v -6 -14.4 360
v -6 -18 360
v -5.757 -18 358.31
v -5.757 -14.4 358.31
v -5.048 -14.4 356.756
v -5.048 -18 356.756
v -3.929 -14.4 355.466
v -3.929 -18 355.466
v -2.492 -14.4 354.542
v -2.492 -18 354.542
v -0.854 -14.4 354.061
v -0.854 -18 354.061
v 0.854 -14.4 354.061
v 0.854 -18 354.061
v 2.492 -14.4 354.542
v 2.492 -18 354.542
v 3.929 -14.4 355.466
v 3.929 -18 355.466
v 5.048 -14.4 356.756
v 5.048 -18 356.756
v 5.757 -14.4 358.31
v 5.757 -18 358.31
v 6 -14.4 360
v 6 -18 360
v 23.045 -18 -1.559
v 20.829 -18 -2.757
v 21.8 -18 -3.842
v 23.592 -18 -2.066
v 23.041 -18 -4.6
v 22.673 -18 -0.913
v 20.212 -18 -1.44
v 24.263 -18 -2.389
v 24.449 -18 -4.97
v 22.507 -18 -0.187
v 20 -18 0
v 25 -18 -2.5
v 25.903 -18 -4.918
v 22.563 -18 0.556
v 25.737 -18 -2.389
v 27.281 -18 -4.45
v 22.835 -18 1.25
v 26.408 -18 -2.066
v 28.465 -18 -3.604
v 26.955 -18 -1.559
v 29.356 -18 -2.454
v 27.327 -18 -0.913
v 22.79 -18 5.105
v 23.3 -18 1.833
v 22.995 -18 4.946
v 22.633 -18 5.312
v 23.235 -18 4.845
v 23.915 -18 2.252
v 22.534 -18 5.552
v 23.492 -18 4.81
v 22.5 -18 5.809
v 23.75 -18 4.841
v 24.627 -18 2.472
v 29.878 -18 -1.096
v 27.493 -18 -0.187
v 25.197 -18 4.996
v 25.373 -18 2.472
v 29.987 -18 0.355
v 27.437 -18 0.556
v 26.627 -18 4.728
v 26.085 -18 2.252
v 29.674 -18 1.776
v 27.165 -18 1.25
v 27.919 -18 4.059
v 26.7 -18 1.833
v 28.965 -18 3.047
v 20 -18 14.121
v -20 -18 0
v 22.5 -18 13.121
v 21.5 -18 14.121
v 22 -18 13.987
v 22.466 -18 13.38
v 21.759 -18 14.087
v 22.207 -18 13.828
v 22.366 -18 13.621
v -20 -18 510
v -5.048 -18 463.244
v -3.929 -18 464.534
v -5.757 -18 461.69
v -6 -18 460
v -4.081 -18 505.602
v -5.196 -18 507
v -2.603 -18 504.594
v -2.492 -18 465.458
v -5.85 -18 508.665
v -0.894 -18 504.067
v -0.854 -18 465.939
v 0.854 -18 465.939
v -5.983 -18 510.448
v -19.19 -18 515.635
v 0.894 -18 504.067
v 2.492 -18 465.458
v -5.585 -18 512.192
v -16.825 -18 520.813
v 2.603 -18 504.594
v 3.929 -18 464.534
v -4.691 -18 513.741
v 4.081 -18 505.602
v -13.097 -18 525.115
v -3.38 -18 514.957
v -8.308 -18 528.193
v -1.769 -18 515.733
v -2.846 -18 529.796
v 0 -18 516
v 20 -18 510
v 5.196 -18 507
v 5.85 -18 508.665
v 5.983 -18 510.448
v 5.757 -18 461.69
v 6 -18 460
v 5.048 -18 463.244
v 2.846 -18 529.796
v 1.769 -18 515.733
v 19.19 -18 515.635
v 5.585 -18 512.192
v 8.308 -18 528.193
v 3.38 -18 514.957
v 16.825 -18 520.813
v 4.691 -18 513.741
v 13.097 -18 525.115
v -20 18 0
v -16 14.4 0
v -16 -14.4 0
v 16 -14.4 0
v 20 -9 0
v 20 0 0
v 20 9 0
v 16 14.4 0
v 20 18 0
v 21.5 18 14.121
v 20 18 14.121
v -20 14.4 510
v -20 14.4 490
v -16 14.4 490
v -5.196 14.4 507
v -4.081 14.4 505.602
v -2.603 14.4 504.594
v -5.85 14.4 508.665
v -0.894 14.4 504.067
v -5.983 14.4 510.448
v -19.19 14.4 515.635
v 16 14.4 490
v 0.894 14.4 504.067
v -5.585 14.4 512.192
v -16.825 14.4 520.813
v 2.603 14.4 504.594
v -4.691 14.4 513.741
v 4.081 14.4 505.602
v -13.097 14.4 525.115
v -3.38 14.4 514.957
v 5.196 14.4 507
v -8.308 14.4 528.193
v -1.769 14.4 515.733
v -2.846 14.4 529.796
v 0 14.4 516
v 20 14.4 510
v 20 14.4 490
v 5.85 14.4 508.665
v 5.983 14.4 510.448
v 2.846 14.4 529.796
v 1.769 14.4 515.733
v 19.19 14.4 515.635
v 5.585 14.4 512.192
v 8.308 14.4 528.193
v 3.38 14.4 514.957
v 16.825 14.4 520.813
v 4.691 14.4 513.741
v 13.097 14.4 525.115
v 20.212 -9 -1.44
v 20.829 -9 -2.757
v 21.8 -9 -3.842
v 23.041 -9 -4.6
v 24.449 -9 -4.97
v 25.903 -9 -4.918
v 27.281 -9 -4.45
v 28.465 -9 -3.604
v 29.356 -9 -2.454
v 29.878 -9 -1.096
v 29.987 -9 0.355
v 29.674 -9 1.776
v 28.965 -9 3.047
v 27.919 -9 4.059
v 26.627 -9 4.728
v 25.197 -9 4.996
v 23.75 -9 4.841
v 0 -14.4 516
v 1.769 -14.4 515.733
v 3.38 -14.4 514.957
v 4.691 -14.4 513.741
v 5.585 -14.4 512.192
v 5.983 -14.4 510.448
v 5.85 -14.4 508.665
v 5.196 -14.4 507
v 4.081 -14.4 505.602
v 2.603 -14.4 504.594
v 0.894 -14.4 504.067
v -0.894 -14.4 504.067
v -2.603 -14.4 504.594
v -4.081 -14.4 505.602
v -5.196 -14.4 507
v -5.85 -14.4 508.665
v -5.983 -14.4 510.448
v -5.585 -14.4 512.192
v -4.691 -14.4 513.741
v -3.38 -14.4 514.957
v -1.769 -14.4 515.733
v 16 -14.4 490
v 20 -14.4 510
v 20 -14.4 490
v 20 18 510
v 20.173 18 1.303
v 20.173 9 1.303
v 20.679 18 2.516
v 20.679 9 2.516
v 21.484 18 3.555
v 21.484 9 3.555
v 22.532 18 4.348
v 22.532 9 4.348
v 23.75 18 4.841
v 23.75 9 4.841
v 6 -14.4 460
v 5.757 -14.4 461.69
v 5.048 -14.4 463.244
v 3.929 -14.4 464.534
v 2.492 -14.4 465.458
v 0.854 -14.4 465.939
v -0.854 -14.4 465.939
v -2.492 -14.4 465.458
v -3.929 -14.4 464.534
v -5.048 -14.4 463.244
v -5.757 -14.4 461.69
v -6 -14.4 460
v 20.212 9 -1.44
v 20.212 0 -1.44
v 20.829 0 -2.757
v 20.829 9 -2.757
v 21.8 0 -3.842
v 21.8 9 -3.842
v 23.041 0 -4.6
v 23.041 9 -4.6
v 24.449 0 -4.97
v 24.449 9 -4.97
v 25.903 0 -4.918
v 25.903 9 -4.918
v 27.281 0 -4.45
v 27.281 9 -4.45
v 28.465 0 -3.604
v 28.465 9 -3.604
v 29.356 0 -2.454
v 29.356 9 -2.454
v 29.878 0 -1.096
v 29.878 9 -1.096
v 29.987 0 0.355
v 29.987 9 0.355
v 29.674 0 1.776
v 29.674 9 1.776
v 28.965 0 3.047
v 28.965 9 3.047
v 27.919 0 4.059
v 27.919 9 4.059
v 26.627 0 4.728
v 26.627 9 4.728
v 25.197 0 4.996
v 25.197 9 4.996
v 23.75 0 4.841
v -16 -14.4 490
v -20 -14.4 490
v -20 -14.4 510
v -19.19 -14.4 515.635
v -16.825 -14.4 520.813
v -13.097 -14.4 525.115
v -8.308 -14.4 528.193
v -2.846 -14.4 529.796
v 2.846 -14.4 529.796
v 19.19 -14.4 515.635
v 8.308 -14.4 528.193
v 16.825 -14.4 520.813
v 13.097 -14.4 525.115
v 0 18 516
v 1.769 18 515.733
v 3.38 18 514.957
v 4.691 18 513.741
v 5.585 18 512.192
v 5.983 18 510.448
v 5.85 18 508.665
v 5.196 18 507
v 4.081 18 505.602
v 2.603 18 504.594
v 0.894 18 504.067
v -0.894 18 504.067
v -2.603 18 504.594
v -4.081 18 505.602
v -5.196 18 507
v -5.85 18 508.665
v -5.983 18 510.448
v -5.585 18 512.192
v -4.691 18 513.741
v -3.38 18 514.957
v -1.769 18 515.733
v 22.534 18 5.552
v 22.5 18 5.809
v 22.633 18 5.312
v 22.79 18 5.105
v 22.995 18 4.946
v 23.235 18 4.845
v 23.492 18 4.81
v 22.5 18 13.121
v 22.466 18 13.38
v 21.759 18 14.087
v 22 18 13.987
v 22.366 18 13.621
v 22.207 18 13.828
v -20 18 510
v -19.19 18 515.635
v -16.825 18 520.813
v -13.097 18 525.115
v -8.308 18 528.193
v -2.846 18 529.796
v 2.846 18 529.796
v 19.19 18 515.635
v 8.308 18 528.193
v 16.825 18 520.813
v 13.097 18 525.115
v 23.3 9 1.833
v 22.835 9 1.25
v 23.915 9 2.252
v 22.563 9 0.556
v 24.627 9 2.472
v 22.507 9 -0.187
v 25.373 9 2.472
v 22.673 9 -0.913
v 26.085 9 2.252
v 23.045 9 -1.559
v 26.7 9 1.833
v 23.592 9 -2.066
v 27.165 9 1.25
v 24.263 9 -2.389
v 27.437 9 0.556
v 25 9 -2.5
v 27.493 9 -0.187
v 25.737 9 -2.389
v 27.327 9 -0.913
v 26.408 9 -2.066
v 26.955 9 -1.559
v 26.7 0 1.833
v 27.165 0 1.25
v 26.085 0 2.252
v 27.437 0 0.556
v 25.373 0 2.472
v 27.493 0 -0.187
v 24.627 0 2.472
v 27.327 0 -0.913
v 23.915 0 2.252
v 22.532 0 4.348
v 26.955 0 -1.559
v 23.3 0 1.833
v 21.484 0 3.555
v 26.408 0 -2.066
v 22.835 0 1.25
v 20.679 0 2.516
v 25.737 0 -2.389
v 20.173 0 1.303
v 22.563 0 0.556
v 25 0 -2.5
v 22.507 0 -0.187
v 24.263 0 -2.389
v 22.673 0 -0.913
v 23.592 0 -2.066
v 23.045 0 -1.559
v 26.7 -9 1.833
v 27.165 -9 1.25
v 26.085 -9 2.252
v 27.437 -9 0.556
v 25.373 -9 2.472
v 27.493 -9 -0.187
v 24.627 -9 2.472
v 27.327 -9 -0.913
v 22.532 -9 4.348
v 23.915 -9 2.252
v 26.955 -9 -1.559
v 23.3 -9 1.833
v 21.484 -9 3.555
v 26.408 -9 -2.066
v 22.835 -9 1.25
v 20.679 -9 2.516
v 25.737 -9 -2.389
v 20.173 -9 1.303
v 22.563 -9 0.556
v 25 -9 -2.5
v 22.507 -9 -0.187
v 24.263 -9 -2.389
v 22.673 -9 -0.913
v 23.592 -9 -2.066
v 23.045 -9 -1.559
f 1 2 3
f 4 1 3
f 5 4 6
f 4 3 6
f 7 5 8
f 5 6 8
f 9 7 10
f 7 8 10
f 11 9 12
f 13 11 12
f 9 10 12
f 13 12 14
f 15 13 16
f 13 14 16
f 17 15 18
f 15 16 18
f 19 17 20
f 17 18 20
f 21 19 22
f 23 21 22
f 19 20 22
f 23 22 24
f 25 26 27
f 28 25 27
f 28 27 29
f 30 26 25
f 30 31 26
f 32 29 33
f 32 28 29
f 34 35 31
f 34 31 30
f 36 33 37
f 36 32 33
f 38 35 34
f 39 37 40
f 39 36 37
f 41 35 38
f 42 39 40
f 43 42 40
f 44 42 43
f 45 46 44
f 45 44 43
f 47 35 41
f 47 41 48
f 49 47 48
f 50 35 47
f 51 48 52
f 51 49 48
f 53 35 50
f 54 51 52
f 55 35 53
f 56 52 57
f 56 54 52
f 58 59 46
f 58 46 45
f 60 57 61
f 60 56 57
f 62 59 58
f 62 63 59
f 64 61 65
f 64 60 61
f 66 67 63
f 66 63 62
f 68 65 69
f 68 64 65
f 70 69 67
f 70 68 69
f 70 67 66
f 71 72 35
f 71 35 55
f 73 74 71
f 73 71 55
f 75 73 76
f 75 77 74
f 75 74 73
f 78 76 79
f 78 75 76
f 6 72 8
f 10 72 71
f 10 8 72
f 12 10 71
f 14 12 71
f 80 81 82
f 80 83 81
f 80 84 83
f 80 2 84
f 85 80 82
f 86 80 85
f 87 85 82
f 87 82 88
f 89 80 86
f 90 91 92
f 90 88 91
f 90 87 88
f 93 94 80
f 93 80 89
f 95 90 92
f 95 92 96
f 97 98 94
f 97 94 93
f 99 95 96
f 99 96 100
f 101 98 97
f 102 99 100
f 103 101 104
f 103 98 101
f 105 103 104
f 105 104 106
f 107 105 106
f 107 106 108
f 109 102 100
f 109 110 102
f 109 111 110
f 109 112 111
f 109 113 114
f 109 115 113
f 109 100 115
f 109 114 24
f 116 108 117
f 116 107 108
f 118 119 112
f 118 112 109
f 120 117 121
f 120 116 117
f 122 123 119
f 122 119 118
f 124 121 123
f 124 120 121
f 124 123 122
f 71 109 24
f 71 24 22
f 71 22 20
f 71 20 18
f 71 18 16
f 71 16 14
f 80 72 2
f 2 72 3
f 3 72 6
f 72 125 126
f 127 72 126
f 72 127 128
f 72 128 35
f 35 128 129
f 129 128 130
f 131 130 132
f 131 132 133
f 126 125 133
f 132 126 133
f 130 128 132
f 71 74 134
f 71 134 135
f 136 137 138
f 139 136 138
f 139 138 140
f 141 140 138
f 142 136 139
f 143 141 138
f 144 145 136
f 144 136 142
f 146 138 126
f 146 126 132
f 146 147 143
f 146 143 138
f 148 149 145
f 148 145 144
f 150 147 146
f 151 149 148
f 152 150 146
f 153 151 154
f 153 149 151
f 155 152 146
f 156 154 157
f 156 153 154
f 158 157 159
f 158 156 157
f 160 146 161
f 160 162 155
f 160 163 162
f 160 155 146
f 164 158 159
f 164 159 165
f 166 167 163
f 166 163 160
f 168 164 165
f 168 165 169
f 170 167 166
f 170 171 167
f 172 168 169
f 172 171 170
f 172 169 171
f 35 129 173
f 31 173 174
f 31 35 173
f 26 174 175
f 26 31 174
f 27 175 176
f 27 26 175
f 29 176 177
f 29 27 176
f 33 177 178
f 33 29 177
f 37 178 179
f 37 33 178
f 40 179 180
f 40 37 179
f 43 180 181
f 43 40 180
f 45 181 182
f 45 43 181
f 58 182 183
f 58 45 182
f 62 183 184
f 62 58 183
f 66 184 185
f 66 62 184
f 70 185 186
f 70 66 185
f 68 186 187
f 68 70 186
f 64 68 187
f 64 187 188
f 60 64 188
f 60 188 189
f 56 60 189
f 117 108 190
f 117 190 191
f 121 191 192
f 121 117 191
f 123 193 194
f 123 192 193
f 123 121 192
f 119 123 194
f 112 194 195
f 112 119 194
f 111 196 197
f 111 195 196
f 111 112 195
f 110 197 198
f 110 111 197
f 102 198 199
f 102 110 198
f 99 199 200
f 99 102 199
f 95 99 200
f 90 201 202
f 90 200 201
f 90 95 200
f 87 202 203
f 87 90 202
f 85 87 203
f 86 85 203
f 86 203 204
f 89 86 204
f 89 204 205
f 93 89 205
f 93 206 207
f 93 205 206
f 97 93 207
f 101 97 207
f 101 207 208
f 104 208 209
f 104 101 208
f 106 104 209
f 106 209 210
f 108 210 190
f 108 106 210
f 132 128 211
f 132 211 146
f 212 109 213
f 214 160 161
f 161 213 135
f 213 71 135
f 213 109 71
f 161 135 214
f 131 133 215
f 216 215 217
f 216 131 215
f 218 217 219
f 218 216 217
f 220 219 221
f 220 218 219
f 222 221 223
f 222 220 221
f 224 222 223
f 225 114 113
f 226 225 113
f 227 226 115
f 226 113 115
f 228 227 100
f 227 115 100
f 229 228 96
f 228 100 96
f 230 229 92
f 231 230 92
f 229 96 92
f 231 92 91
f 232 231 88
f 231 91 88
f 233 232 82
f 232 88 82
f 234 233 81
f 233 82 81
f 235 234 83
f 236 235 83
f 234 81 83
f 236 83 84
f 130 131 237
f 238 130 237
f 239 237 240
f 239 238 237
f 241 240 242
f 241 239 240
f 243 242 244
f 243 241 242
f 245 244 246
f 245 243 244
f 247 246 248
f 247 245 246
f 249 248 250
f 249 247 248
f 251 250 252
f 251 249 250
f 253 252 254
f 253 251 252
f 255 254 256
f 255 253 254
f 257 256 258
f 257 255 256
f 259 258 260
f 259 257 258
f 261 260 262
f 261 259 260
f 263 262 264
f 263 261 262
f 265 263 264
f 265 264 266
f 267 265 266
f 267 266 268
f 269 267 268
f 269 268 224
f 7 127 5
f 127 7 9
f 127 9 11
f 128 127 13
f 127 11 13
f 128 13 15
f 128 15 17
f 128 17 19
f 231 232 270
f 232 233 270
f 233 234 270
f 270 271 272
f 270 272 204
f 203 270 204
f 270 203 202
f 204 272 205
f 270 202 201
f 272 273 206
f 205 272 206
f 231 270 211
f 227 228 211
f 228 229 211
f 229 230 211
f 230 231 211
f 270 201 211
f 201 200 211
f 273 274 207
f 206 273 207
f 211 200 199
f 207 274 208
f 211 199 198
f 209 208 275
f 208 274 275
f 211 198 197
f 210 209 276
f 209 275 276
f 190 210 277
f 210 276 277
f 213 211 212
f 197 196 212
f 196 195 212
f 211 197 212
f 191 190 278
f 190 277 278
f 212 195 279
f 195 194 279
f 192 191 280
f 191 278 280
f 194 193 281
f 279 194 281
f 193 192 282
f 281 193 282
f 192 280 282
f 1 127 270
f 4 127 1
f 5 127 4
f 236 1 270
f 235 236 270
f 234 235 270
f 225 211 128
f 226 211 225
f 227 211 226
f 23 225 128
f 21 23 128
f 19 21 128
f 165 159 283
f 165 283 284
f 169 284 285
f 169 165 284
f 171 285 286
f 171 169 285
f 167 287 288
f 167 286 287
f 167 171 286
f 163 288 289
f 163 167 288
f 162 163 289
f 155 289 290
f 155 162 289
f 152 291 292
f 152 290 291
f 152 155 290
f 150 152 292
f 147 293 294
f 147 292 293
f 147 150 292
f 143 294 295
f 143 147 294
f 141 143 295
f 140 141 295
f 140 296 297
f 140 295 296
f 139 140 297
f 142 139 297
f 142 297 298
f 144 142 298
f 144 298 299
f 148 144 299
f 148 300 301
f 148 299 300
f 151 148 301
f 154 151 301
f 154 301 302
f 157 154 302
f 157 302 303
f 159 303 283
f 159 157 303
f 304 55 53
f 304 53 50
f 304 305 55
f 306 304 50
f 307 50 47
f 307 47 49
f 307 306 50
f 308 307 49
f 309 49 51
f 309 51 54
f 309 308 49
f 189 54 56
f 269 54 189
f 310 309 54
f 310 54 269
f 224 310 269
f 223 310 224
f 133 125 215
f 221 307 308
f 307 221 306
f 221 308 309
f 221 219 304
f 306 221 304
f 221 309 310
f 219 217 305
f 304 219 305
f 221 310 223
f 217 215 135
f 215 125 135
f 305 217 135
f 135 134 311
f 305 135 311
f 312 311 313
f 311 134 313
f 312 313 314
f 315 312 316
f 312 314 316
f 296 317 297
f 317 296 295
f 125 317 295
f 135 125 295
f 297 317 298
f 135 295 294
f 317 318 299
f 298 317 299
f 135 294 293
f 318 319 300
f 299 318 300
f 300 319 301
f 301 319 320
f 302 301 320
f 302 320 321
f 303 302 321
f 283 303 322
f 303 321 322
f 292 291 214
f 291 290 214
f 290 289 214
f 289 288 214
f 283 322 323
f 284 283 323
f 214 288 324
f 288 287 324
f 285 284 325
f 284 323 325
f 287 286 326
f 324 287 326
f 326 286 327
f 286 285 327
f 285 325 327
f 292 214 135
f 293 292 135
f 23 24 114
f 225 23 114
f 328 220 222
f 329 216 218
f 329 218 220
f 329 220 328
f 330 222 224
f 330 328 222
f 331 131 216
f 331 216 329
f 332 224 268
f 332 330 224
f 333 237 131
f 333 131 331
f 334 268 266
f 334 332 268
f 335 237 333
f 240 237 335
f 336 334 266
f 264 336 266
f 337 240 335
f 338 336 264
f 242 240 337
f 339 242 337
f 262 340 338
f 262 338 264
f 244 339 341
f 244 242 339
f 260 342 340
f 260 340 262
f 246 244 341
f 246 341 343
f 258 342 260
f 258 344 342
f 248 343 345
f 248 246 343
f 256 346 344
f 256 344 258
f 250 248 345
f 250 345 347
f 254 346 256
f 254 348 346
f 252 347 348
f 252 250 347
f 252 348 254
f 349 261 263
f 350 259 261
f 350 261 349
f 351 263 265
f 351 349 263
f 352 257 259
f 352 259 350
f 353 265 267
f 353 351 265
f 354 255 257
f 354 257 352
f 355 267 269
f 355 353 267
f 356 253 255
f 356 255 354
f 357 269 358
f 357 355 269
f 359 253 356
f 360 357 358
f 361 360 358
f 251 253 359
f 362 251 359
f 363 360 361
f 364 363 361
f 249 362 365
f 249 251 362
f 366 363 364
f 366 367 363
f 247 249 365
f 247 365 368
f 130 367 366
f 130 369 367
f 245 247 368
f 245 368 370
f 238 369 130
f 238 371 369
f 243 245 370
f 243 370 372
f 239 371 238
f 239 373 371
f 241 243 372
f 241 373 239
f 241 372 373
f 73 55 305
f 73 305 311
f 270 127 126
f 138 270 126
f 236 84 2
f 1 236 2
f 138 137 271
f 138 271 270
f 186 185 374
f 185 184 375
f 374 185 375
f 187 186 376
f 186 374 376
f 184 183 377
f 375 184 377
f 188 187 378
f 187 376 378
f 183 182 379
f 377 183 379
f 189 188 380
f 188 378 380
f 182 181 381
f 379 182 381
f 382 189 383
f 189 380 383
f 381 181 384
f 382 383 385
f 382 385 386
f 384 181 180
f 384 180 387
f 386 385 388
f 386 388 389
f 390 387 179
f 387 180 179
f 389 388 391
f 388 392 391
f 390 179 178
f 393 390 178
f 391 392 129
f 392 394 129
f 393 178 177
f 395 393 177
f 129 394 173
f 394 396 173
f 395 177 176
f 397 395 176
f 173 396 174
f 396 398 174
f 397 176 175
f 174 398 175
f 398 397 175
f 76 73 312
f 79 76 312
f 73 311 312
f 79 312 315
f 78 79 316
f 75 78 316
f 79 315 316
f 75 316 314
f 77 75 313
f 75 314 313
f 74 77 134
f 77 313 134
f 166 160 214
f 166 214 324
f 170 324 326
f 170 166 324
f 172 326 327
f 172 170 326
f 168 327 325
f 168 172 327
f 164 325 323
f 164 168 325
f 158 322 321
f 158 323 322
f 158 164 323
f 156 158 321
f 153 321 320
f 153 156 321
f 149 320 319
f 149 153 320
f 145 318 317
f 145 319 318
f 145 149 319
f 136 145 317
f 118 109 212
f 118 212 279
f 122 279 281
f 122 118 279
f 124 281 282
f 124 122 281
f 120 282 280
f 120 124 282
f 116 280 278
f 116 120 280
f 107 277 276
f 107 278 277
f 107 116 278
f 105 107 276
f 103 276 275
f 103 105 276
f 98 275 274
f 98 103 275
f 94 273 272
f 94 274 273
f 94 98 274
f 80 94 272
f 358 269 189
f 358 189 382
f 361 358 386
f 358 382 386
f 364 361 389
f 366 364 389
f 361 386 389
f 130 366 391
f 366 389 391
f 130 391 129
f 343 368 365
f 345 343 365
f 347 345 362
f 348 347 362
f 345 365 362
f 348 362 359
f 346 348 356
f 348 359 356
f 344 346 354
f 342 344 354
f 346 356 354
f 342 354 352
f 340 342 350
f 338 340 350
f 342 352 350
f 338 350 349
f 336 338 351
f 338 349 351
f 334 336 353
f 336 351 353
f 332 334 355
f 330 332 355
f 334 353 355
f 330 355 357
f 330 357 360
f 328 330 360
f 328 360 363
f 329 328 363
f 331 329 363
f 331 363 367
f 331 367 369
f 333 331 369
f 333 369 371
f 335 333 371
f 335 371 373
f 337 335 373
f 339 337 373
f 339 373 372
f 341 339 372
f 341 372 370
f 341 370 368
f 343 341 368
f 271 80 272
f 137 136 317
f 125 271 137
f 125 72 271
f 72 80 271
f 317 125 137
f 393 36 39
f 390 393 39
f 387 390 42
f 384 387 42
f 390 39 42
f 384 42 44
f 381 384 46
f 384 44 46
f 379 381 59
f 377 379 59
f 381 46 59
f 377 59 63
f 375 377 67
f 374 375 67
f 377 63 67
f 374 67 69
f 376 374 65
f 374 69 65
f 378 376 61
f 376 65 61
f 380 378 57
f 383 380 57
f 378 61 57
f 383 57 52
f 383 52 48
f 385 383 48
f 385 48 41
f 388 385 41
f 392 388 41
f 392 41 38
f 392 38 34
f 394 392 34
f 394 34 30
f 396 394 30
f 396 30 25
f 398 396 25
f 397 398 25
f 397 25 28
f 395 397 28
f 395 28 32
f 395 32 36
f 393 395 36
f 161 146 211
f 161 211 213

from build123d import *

# Parameters (mm, degrees)
SKETCH1_W               = 40
SKETCH1_H               = 36
SKETCH1_W_2             = 32
SKETCH1_H_2             = 28.8
BOSS_EXTRUDE1_DEPTH     = 530
SKETCH2_W               = 50
SKETCH2_H               = 28.8
CUT_EXTRUDE1_DEPTH      = 40
FILLET2_RADIUS          = 20
FILLET2_LENGTH          = 3.6
FILLET3_RADIUS          = 20
FILLET3_LENGTH          = 3.6
CUT_EXTRUDE2_DEPTH      = 532.597592169
CUT_EXTRUDE2_DEPTH_BACK = 532.597592169
SKETCH3_R               = 6
CUT_EXTRUDE3_DEPTH      = 10
SKETCH9_R               = 2.5
BOSS_EXTRUDE2_DEPTH     = 36
FILLET4_R               = 1
FILLET5_R               = 1
CUT_EXTRUDE5_START      = -9
SKETCH12_R              = 5
CUT_EXTRUDE5_DEPTH      = 9
SKETCH14_R              = 5
CUT_EXTRUDE6_DEPTH      = 9


with BuildPart() as part:
    # Sketch1 → Boss-Extrude1 (new body)
    with BuildSketch(Plane.XY):
        Rectangle(SKETCH1_W, SKETCH1_H)
        Rectangle(SKETCH1_W_2, SKETCH1_H_2, mode=Mode.SUBTRACT)
    extrude(amount=BOSS_EXTRUDE1_DEPTH)

    # Sketch2 → Cut-Extrude1 (cut)
    with BuildSketch(Plane.XY.offset(530)):
        Rectangle(SKETCH2_W, SKETCH2_H)
    extrude(amount=-CUT_EXTRUDE1_DEPTH, mode=Mode.SUBTRACT)

    # Fillet2: full round fillet: the end face becomes a half cylinder, R = half its width
    fillet2_face = Plane((0, -16.2, 530), x_dir=(0, -1, 0), z_dir=(0, 0, 1))  # on the end face: x along it, z out of the body
    fillet2_slab = fillet2_face.offset(-FILLET2_RADIUS / 2) * Box(FILLET2_LENGTH, 2 * FILLET2_RADIUS, FILLET2_RADIUS, mode=Mode.PRIVATE)  # the body's end, R deep
    fillet2_round = Plane((0, -16.2, 510), x_dir=(0, 0, 1), z_dir=(0, -1, 0)) * Cylinder(FILLET2_RADIUS, FILLET2_LENGTH, mode=Mode.PRIVATE)  # its axis R under the face
    add(fillet2_slab - fillet2_round, mode=Mode.SUBTRACT)

    # Fillet3: full round fillet: the end face becomes a half cylinder, R = half its width
    fillet3_face = Plane((0, 16.2, 530), x_dir=(0, -1, 0), z_dir=(0, 0, 1))  # on the end face: x along it, z out of the body
    fillet3_slab = fillet3_face.offset(-FILLET3_RADIUS / 2) * Box(FILLET3_LENGTH, 2 * FILLET3_RADIUS, FILLET3_RADIUS, mode=Mode.PRIVATE)  # the body's end, R deep
    fillet3_round = Plane((0, 16.2, 510), x_dir=(0, 0, 1), z_dir=(0, -1, 0)) * Cylinder(FILLET3_RADIUS, FILLET3_LENGTH, mode=Mode.PRIVATE)  # its axis R under the face
    add(fillet3_slab - fillet3_round, mode=Mode.SUBTRACT)

    # Sketch3 → Cut-Extrude2 (cut, two sides: drawn at the far end of the back side and taken through both)
    with BuildSketch(Plane(origin=(0, 18, 0), x_dir=(1, 0, 0), z_dir=(0, 1, 0)).offset(-CUT_EXTRUDE2_DEPTH_BACK)):
        with Locations(Location((0, -510, 0), (0, 0, 270))):
            Circle(SKETCH3_R)
    extrude(amount=CUT_EXTRUDE2_DEPTH + CUT_EXTRUDE2_DEPTH_BACK, mode=Mode.SUBTRACT)

    # Sketch6 → Cut-Extrude3 (cut)
    with BuildSketch(Plane.XZ.offset(18)):
        with BuildLine():
            ThreePointArc((6, 460), (0, 466), (-6, 460))
            Line((-6, 460), (-6, 360))
            ThreePointArc((-6, 360), (0, 354), (6, 360))
            Line((6, 360), (6, 460))
        make_face()
    extrude(amount=-CUT_EXTRUDE3_DEPTH, mode=Mode.SUBTRACT)

    # Sketch9 → Boss-Extrude2 (add)
    with BuildSketch(Plane.XZ.offset(18)):
        with BuildLine():
            Line((20, 14.120693524), (20, 0))
            ThreePointArc((20, 0), (29.330127019, -2.5), (22.5, 4.330127019))
            Line((22.5, 4.330127019), (22.5, 14.120693524))
            Line((22.5, 14.120693524), (20, 14.120693524))
        make_face()
        with Locations(Location((25, 0, 0), (0, 0, 270))):
            Circle(SKETCH9_R, mode=Mode.SUBTRACT)
    extrude(amount=-BOSS_EXTRUDE2_DEPTH)

    # Fillet4
    fillet4_edges = [part.edges().sort_by_distance(p)[0] for p in [
        (22.5, 0, 4.330127019),
    ]]
    fillet(fillet4_edges, radius=FILLET4_R)

    # Fillet5
    fillet5_edges = [part.edges().sort_by_distance(p)[0] for p in [
        (22.5, 0, 14.120693524),
    ]]
    fillet(fillet5_edges, radius=FILLET5_R)

    # Sketch12 → Cut-Extrude5 (cut)
    with BuildSketch(Plane(origin=(0, 18, 0), x_dir=(1, 0, 0), z_dir=(0, 1, 0)).offset(CUT_EXTRUDE5_START)):
        with Locations((25, 0)):
            Circle(SKETCH12_R)
    extrude(amount=CUT_EXTRUDE5_DEPTH, mode=Mode.SUBTRACT)

    # Sketch14 → Cut-Extrude6 (cut)
    with BuildSketch(Plane(origin=(0, -9, 0), x_dir=(-1, 0, 0), z_dir=(0, -1, 0))):
        with Locations((-25, 0)):
            Circle(SKETCH14_R)
    extrude(amount=-CUT_EXTRUDE6_DEPTH, mode=Mode.SUBTRACT)


solid = part.part
